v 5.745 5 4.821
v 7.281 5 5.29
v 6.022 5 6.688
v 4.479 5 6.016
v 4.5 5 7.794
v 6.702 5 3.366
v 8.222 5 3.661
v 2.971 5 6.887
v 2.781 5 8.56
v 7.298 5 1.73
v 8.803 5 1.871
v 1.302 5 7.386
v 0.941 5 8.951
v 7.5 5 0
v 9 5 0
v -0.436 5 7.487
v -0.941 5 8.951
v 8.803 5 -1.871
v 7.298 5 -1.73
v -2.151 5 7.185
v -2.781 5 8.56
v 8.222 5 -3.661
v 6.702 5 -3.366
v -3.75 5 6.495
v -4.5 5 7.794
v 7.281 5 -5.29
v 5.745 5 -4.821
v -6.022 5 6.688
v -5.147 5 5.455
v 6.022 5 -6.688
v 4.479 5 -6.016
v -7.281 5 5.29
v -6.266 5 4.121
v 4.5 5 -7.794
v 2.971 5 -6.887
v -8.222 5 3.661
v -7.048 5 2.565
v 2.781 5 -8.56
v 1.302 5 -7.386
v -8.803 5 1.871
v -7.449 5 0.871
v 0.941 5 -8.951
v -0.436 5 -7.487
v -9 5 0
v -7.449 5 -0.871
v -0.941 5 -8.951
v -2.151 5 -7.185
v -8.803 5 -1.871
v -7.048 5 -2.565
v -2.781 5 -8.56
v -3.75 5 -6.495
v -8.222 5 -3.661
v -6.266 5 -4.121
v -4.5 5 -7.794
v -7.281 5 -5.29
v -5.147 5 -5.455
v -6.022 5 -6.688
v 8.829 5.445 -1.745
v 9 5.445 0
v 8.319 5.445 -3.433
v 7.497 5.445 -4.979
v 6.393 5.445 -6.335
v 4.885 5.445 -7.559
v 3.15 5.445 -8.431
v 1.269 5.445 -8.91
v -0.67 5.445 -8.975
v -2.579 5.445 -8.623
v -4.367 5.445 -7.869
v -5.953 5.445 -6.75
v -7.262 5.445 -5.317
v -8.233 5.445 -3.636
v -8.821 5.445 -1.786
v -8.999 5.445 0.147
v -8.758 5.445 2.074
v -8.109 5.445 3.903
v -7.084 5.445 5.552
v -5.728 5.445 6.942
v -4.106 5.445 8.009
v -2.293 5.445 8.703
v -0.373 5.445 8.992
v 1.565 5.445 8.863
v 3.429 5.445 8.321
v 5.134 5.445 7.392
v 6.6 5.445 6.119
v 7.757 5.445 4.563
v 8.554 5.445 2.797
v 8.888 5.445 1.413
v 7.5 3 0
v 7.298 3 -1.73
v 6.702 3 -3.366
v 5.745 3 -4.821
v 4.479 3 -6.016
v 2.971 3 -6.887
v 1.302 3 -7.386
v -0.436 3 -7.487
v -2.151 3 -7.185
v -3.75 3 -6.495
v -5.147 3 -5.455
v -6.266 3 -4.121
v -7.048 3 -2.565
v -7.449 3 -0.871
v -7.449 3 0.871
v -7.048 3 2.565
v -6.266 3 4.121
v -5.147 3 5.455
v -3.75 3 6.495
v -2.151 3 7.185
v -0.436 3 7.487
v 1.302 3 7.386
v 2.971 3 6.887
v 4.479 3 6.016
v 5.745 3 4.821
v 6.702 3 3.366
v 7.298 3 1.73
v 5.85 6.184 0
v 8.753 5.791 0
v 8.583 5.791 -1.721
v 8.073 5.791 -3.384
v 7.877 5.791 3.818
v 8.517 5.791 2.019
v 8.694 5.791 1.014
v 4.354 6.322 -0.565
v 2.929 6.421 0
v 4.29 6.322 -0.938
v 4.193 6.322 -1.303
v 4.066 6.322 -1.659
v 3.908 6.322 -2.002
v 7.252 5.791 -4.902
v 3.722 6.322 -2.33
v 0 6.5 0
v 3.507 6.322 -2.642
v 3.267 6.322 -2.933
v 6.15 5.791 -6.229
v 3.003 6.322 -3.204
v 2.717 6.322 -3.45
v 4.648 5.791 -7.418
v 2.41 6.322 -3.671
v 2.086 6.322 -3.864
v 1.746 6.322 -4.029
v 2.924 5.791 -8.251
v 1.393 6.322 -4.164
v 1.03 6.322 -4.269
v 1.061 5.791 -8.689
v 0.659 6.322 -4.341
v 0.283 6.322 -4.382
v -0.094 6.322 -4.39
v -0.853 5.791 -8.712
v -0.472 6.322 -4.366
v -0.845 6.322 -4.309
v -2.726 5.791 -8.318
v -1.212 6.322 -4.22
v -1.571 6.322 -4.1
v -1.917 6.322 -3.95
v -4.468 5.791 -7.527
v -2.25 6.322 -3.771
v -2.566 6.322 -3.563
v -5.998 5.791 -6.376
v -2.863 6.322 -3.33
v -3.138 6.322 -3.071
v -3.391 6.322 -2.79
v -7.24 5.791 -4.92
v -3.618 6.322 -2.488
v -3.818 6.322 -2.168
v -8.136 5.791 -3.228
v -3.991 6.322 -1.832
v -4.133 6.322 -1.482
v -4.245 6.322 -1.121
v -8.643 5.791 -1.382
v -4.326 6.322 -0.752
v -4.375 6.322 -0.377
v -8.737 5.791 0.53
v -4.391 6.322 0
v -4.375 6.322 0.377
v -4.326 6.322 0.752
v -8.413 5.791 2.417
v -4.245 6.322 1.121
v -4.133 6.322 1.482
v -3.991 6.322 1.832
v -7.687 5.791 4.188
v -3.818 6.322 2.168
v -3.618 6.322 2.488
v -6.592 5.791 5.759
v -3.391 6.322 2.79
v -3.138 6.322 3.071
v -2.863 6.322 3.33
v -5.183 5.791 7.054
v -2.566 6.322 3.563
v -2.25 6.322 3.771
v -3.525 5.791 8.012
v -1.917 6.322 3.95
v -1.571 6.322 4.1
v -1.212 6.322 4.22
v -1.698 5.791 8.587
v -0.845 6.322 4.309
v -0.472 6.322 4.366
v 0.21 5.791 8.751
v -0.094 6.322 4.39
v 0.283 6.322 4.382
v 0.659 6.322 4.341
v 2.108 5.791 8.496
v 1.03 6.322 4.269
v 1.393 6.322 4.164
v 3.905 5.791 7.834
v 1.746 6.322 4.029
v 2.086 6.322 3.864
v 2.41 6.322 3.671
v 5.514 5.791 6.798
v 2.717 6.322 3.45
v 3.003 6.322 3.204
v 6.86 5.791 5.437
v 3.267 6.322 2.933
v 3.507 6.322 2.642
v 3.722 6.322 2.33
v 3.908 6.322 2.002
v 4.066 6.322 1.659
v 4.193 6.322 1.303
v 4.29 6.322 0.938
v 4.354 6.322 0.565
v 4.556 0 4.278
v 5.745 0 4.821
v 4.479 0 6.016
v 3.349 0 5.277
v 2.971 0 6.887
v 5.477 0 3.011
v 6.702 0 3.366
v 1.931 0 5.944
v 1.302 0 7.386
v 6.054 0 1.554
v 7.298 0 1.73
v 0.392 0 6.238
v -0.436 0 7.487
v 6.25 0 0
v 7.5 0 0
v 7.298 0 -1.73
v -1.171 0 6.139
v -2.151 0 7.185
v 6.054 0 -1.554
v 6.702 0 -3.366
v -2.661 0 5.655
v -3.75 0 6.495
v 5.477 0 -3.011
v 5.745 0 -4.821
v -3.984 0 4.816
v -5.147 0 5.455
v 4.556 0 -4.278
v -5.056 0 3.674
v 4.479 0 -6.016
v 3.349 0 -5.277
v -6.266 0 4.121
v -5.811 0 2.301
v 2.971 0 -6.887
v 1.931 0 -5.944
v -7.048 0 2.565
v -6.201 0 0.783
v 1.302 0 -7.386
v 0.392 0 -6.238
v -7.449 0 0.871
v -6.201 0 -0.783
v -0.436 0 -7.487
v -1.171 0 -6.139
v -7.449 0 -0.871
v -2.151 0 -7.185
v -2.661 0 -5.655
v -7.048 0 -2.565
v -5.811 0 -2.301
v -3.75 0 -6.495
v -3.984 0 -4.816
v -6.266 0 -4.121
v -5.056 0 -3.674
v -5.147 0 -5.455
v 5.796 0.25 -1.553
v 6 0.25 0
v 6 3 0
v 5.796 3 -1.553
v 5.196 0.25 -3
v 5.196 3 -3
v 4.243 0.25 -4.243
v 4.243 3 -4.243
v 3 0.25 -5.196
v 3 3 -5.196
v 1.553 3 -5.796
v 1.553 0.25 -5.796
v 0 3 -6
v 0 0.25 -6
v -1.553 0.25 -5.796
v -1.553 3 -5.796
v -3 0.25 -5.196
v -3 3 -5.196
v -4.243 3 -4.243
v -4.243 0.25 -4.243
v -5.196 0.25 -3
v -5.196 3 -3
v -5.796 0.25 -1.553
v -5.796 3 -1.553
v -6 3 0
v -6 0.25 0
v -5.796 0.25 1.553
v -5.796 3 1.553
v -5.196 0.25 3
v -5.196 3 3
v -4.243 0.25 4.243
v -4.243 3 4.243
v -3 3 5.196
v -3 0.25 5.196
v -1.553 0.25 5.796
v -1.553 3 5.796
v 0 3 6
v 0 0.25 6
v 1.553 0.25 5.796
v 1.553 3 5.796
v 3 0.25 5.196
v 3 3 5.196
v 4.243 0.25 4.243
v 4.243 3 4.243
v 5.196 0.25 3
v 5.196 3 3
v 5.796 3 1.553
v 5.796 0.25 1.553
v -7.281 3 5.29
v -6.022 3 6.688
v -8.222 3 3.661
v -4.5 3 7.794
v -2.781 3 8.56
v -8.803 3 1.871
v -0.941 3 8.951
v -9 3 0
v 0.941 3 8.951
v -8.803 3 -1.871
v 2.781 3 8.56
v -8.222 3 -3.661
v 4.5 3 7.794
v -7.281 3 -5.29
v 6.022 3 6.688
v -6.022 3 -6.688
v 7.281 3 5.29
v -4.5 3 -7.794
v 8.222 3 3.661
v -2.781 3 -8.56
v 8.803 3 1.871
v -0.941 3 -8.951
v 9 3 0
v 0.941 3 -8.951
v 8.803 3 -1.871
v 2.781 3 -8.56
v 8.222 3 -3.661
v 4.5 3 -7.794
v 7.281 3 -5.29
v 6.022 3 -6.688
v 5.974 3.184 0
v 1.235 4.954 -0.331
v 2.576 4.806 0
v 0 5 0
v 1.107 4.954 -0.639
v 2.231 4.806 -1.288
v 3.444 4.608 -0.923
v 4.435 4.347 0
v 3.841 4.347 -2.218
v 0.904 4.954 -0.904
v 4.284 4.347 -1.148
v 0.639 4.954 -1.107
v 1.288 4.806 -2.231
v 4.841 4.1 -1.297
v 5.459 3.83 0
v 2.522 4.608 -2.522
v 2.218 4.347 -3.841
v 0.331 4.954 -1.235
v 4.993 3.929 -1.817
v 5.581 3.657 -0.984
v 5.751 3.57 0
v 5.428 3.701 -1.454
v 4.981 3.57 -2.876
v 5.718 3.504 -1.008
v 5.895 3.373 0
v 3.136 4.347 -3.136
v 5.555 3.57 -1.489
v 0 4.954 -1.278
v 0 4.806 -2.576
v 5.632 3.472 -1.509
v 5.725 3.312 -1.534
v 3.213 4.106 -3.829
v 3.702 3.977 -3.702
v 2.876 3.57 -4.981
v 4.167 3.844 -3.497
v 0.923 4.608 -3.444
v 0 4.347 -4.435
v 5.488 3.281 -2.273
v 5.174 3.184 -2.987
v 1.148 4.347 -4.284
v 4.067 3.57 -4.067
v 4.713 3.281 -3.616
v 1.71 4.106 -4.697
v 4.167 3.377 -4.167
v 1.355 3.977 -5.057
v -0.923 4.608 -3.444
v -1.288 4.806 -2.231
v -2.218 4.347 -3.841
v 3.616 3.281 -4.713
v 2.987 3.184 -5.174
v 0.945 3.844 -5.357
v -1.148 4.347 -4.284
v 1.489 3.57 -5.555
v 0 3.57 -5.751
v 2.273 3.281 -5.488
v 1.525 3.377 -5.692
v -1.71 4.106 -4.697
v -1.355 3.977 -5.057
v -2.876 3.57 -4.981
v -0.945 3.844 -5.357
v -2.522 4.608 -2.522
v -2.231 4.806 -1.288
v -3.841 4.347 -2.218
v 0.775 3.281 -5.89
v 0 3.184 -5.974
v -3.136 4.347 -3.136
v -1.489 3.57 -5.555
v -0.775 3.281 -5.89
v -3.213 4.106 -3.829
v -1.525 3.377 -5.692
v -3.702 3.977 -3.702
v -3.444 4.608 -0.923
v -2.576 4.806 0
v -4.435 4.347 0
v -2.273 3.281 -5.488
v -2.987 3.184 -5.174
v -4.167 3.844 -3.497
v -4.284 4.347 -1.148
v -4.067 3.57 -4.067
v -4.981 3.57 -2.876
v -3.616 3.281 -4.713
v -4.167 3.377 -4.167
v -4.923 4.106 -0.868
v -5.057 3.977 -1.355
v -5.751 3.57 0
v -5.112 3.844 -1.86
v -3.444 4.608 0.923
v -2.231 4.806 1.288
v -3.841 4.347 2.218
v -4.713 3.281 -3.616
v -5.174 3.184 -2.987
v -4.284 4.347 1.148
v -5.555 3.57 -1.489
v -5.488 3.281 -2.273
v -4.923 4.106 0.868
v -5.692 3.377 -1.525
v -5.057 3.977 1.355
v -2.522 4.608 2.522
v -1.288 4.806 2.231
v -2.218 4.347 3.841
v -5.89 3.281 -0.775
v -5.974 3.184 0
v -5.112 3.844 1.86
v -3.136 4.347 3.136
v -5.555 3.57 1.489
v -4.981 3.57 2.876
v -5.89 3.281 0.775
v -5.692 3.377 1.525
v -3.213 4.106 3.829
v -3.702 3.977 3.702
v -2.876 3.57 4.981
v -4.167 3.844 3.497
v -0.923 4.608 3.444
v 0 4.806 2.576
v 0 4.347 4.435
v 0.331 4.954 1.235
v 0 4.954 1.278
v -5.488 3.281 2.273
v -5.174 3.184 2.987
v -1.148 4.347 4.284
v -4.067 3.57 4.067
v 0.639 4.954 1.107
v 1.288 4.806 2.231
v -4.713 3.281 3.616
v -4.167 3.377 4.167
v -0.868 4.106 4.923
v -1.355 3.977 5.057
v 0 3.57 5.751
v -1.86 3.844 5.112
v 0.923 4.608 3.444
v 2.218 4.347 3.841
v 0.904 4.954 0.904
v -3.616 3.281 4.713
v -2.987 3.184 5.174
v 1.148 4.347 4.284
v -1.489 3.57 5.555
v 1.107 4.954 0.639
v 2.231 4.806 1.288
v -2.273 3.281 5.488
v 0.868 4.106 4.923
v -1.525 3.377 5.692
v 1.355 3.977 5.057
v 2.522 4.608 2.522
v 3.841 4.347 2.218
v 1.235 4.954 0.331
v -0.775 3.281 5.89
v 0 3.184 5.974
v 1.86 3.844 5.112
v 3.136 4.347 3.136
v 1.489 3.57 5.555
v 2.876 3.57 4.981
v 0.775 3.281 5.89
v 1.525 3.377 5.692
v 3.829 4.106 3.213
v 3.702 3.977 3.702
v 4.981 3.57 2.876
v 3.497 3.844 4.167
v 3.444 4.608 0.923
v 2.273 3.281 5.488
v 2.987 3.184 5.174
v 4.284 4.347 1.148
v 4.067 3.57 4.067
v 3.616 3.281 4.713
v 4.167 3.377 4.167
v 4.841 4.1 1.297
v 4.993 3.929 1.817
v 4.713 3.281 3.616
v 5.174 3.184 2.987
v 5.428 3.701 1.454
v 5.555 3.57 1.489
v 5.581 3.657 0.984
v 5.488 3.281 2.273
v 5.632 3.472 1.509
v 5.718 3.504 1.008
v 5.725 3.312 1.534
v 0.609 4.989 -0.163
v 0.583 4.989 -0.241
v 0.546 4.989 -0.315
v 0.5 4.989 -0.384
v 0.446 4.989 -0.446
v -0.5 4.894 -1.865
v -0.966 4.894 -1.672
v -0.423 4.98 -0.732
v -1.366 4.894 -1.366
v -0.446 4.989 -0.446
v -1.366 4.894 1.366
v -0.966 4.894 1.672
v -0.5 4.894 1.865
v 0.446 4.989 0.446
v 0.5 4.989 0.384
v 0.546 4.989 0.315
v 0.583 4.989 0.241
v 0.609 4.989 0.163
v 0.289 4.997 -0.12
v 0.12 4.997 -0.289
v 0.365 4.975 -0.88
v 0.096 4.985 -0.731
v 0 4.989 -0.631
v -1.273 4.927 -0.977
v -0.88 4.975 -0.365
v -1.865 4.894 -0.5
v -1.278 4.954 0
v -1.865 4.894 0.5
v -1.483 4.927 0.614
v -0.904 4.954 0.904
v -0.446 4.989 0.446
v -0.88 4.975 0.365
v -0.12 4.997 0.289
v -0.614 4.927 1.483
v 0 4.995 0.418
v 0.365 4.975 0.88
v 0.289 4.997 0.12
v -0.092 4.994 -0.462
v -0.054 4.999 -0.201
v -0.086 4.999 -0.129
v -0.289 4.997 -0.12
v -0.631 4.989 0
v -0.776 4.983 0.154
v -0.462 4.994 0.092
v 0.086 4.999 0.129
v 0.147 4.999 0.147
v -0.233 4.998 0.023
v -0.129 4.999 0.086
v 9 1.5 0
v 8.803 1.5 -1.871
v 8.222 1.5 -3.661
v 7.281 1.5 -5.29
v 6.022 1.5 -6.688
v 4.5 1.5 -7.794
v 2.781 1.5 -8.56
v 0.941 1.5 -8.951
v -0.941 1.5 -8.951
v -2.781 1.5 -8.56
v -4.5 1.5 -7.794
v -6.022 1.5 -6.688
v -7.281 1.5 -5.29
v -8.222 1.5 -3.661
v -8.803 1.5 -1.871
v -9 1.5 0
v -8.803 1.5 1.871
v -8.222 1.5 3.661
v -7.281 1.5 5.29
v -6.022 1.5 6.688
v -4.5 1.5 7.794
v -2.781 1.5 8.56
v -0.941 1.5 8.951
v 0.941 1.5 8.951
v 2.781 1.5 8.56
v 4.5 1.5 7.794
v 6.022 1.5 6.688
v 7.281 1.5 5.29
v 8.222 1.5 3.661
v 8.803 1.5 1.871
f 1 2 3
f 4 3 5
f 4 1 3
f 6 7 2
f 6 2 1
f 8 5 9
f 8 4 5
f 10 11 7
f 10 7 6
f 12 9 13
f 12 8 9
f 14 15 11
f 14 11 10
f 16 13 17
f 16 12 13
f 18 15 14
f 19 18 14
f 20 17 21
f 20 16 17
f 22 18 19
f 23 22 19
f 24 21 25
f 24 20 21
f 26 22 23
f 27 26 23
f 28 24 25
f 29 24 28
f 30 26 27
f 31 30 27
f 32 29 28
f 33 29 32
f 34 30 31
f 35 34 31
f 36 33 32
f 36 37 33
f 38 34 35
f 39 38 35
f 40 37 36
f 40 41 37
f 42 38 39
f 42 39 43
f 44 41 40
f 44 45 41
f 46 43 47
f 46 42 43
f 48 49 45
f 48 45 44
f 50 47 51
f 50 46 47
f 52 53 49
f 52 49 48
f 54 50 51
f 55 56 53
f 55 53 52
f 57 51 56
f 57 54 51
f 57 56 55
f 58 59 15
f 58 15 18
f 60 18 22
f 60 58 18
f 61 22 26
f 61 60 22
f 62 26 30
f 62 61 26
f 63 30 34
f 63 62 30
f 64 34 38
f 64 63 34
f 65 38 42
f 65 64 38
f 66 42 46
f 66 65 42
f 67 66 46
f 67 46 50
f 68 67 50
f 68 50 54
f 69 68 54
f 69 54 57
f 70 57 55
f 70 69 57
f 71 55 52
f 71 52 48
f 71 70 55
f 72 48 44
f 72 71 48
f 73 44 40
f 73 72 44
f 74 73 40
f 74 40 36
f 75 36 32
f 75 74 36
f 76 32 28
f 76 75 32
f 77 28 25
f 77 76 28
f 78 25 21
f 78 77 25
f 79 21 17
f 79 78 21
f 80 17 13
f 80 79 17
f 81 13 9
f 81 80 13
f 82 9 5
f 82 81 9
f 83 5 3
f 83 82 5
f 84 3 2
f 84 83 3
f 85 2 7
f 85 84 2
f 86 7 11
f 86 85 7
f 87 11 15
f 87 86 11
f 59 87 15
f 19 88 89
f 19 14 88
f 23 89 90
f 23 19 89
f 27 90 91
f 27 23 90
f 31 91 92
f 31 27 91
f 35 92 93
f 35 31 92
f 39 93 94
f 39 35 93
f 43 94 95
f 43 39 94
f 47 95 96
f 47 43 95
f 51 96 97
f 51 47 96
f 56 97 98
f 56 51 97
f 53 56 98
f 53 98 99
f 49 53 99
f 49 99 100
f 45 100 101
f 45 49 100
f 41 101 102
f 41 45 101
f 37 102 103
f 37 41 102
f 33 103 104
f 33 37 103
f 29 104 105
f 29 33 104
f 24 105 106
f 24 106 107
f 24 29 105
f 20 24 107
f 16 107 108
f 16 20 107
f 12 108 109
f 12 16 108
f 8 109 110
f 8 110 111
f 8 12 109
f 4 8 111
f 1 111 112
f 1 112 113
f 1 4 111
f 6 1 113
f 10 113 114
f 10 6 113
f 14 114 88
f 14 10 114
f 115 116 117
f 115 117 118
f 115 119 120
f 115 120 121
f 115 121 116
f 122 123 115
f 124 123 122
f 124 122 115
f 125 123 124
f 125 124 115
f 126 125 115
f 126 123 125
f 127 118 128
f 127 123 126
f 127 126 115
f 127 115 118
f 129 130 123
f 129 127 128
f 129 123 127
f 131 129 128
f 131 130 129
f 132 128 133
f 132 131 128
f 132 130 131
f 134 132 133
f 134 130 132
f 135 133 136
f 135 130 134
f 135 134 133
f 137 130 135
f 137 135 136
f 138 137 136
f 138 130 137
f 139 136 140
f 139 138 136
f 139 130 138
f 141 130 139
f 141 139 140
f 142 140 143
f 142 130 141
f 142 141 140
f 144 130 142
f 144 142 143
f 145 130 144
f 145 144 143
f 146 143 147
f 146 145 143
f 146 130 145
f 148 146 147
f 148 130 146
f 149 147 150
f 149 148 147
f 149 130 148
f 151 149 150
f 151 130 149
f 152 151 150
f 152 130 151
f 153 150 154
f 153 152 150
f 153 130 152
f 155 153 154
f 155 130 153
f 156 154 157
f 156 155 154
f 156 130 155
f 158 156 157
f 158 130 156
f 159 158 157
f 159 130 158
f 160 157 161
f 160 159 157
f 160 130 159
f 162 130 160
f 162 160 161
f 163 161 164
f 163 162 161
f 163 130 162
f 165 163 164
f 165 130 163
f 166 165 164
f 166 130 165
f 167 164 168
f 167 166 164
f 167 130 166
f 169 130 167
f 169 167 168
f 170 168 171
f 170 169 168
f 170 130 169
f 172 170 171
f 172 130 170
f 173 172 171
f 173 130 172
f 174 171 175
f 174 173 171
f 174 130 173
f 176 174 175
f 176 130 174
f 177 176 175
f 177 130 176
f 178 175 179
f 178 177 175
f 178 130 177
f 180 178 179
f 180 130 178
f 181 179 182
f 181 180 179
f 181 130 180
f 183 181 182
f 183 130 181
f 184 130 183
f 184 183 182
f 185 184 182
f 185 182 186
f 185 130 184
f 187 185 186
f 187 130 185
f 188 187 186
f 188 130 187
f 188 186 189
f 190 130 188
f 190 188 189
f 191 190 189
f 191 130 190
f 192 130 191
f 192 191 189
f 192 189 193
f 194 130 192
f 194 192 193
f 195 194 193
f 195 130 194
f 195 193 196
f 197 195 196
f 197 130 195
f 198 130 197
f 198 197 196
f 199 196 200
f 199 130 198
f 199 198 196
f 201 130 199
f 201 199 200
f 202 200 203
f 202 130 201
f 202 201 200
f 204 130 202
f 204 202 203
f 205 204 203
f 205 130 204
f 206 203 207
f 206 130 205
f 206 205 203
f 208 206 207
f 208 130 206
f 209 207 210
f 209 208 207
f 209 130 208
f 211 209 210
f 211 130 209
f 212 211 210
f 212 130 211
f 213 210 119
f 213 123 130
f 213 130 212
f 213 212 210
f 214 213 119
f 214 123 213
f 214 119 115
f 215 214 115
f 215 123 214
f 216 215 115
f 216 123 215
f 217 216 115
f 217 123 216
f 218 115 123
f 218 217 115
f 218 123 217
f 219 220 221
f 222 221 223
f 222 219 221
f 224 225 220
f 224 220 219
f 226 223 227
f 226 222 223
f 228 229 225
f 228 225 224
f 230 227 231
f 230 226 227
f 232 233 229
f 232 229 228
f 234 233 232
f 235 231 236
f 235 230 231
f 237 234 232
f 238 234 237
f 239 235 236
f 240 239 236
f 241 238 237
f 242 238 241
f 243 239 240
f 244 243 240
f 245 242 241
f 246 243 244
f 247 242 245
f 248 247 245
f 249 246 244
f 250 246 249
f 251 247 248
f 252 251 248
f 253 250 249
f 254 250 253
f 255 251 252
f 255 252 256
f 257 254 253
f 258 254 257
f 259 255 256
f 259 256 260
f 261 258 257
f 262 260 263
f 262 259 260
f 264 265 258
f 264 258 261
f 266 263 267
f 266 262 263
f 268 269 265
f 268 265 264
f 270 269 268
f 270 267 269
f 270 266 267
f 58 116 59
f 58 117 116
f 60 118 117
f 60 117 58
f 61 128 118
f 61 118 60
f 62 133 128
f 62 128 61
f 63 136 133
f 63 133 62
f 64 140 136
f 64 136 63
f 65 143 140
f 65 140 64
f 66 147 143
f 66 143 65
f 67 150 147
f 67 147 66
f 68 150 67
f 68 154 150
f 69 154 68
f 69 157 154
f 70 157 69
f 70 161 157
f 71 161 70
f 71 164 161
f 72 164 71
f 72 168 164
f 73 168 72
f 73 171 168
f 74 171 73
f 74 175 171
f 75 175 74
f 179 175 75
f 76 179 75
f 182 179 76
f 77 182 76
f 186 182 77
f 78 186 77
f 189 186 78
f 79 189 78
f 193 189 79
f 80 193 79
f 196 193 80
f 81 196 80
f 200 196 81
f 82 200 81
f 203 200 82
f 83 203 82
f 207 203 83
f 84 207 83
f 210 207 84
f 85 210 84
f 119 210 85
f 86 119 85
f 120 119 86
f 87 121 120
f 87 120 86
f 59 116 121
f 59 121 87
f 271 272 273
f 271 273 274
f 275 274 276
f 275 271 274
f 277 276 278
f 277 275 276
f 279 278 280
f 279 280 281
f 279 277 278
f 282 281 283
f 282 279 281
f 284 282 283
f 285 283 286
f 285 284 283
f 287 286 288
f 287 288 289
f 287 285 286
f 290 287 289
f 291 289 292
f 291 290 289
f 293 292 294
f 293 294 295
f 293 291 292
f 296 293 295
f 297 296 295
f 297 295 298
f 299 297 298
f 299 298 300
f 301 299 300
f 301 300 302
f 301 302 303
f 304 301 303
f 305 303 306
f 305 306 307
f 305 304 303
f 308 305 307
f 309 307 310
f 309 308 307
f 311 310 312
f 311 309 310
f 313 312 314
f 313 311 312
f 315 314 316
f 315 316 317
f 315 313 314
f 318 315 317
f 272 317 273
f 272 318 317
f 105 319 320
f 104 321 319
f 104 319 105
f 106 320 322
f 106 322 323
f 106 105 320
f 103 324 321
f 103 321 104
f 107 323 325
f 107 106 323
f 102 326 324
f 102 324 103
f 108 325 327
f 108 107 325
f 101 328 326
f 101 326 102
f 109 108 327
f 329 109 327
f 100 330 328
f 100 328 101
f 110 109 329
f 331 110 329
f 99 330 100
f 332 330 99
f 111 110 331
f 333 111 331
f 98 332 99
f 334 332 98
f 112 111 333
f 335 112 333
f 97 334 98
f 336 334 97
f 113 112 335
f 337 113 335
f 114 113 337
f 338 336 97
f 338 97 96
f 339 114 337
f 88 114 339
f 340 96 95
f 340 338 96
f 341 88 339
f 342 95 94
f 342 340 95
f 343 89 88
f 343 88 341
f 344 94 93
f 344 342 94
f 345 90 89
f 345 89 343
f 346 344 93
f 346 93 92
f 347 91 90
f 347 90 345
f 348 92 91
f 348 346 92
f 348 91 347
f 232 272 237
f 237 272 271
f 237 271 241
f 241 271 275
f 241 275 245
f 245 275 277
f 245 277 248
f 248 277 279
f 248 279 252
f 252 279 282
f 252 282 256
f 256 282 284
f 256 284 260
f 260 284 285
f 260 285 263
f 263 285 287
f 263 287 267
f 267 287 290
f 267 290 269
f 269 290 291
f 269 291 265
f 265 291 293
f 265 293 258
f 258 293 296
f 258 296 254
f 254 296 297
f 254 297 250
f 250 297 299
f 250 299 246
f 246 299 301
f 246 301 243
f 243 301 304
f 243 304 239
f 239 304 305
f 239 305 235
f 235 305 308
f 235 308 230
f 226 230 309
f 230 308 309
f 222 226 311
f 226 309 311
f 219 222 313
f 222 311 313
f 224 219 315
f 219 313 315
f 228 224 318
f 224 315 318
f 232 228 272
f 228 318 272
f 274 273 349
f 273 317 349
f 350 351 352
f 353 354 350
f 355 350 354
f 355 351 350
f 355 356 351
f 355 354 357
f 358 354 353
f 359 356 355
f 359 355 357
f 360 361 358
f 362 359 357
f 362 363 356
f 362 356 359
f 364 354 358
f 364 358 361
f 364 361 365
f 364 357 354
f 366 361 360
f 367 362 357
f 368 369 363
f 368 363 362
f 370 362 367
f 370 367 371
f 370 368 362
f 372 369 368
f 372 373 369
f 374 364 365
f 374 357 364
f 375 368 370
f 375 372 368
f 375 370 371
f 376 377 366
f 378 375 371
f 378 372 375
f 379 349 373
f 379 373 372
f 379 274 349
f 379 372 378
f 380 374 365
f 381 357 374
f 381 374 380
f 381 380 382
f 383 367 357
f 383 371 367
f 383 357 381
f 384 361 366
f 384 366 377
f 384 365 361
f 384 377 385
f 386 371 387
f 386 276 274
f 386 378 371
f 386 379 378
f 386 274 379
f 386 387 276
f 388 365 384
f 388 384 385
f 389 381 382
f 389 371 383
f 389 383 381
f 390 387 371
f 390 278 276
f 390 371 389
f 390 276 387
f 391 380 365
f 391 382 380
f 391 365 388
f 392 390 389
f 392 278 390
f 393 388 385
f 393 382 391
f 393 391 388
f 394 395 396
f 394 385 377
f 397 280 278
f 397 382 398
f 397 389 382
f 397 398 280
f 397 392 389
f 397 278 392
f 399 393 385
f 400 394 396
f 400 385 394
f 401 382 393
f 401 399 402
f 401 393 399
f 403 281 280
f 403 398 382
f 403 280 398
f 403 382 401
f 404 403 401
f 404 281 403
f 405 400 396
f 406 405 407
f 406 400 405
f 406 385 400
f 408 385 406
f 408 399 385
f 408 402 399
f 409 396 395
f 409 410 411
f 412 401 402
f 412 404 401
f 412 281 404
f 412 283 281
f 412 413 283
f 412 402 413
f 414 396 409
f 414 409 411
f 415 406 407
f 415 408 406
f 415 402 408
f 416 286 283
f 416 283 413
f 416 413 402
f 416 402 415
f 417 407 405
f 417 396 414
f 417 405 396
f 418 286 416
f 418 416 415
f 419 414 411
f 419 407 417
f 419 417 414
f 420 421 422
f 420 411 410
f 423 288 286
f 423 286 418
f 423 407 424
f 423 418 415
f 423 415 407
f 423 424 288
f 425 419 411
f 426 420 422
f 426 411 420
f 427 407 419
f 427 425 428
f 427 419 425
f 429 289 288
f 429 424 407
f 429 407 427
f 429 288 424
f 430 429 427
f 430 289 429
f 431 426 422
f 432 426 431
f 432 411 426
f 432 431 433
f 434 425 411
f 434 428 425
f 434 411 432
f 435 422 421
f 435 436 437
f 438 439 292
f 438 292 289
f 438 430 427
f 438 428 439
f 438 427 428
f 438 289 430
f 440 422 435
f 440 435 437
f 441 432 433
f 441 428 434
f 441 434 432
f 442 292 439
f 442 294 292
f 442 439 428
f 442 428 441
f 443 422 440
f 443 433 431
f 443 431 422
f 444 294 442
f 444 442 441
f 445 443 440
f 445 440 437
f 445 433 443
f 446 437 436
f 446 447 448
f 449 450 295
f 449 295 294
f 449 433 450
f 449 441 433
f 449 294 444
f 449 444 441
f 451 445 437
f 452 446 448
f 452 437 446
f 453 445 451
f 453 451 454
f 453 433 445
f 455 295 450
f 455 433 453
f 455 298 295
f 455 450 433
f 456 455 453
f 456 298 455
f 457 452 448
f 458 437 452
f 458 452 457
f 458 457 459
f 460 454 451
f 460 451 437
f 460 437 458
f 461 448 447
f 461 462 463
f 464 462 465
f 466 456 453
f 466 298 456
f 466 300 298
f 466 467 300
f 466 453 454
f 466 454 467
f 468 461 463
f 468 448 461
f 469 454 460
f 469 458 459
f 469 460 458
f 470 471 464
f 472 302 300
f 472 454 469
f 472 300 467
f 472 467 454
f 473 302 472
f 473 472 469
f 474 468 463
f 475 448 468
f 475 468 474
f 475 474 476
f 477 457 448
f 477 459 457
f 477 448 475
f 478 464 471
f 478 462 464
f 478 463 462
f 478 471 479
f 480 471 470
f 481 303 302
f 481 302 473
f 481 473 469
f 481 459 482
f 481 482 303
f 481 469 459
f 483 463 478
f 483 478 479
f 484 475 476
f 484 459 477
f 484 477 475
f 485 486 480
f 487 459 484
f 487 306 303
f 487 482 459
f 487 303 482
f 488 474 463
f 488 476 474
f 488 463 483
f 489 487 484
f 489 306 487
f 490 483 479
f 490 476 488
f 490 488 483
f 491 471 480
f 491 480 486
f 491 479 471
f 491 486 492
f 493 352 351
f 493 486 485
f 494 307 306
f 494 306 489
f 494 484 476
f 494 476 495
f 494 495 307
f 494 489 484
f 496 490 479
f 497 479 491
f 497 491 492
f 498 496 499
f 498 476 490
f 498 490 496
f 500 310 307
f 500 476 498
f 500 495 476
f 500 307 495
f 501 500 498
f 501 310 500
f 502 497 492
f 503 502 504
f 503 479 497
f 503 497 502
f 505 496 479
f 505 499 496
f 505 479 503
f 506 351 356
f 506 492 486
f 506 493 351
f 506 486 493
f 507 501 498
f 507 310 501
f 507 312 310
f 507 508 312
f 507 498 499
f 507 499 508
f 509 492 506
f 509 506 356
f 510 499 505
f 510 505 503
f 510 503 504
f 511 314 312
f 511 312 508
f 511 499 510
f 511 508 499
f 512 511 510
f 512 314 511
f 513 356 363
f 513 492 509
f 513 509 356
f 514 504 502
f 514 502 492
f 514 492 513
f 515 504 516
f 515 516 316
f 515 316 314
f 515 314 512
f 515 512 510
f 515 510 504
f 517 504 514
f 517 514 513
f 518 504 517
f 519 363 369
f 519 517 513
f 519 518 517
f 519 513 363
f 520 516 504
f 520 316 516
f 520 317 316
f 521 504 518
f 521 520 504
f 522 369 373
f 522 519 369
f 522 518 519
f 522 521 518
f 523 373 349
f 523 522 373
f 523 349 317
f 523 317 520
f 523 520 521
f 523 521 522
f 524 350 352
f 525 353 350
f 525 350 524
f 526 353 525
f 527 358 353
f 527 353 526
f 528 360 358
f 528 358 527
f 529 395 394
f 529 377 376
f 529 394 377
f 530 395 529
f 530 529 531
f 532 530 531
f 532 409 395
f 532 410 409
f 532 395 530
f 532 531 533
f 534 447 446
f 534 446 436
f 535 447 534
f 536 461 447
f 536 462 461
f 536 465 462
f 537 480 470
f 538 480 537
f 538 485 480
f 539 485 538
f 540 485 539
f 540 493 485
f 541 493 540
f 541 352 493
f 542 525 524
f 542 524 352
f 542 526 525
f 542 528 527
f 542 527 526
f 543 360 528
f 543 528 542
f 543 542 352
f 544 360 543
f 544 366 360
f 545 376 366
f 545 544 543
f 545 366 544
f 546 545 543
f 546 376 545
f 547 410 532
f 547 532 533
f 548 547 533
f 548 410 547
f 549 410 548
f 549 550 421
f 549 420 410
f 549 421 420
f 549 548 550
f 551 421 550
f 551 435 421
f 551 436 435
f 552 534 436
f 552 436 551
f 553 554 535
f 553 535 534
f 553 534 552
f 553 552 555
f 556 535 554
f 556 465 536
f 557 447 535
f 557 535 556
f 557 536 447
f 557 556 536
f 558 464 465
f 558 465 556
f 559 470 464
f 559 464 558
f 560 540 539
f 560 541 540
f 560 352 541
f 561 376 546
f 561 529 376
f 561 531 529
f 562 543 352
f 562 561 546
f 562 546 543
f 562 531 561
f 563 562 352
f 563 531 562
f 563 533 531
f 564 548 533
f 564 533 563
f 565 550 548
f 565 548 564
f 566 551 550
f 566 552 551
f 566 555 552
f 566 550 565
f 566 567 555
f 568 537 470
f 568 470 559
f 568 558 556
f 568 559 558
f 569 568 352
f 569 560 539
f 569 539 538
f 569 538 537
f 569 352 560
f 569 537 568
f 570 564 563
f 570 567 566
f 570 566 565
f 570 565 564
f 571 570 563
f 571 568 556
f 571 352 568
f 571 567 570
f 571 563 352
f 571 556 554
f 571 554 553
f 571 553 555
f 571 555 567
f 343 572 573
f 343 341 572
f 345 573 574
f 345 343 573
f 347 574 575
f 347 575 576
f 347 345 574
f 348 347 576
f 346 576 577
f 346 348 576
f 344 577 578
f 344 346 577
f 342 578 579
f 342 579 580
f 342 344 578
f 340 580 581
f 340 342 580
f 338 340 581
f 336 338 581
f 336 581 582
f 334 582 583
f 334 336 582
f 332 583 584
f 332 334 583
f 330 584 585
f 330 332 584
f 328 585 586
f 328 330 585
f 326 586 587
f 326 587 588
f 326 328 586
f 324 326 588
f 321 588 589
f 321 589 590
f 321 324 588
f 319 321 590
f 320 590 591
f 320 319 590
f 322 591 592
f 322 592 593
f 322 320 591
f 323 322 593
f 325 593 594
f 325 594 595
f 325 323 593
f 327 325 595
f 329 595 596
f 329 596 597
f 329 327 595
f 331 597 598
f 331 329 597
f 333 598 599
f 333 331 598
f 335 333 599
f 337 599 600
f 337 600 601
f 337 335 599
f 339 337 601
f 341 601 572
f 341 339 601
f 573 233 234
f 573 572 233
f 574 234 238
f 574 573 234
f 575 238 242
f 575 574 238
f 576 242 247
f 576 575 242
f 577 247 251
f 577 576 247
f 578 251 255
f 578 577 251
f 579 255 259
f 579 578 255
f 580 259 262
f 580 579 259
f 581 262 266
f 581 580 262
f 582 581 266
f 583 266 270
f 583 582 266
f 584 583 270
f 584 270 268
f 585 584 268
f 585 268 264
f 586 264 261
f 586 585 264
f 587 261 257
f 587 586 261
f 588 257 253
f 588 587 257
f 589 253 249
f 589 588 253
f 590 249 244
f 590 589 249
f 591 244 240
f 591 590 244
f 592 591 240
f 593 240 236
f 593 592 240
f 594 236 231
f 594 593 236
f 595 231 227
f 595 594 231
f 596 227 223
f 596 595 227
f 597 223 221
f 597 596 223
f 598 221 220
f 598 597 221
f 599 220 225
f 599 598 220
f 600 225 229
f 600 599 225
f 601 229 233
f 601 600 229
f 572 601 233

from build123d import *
from OCP.BRepFilletAPI import BRepFilletAPI_MakeChamfer

# Parameters (mm, degrees)
CHAMFER1_SIZE  = 0.25
CHAMFER1_SIZE2 = 0.304621849


with BuildPart() as part:
    # Sketch1 → Revolve1 (revolve)
    with BuildSketch(Plane.XY, mode=Mode.PRIVATE) as revolve1_sk:
        with BuildLine():
            Line((-6, 0), (-7.5, 0))
            Line((-7.5, 0), (-9, 1.5))
            Line((-9, 1.5), (-9, 3))
            Line((-9, 3), (-7.5, 3))
            Line((-7.5, 3), (-7.5, 5))
            Line((-7.5, 5), (-9, 5))
            Line((-9, 5), (-9, 5.75))
            ThreePointArc((-9, 5.75), (-4.515597967, 6.312175605), (0, 6.5))
            Line((0, 6.5), (0, 5))
            add(Edge.make_bspline(
                [(0, 5), (-6, 5), (-6, 3)],
                knots=[1.570796327, 1.570796327, 1.570796327, 3.141592654, 3.141592654, 3.141592654], degree=2, weights=[1, 0.707106781, 1]))
            Line((-6, 3), (-6, 0))
        make_face()
    revolve(revolve1_sk.sketch.rotate(Axis((0, -1000, 0), (0, 1, 0)), 180), axis=Axis((0, -1000, 0), (0, 1, 0)))

    # Chamfer1: one chamfer whose edges measure the first distance from different faces: ONE call of the kernel's chamfer builder (chamfer() names one face for all edges)
    chamfer1_edges_1 = [part.edges().sort_by_distance(p)[0] for p in [
        (-9, 5.75, 0),
    ]]
    chamfer1_side_1 = [part.faces().sort_by_distance(p)[0] for p in [
        (-4.515597967, 6.312175605, 0),
    ]]
    chamfer1_edges_2 = [part.edges().sort_by_distance(p)[0] for p in [
        (-6, 0, 0),
    ]]
    chamfer1 = BRepFilletAPI_MakeChamfer(part.part.solid().wrapped)
    for e in chamfer1_edges_1:
        chamfer1.Add(CHAMFER1_SIZE, CHAMFER1_SIZE2, e.wrapped, chamfer1_side_1[0].wrapped)  # the first distance lies on this face
    for e in chamfer1_edges_2:
        chamfer1.Add(CHAMFER1_SIZE, e.wrapped)
    add(Compound.cast(chamfer1.Shape()), mode=Mode.REPLACE)


solid = part.part
